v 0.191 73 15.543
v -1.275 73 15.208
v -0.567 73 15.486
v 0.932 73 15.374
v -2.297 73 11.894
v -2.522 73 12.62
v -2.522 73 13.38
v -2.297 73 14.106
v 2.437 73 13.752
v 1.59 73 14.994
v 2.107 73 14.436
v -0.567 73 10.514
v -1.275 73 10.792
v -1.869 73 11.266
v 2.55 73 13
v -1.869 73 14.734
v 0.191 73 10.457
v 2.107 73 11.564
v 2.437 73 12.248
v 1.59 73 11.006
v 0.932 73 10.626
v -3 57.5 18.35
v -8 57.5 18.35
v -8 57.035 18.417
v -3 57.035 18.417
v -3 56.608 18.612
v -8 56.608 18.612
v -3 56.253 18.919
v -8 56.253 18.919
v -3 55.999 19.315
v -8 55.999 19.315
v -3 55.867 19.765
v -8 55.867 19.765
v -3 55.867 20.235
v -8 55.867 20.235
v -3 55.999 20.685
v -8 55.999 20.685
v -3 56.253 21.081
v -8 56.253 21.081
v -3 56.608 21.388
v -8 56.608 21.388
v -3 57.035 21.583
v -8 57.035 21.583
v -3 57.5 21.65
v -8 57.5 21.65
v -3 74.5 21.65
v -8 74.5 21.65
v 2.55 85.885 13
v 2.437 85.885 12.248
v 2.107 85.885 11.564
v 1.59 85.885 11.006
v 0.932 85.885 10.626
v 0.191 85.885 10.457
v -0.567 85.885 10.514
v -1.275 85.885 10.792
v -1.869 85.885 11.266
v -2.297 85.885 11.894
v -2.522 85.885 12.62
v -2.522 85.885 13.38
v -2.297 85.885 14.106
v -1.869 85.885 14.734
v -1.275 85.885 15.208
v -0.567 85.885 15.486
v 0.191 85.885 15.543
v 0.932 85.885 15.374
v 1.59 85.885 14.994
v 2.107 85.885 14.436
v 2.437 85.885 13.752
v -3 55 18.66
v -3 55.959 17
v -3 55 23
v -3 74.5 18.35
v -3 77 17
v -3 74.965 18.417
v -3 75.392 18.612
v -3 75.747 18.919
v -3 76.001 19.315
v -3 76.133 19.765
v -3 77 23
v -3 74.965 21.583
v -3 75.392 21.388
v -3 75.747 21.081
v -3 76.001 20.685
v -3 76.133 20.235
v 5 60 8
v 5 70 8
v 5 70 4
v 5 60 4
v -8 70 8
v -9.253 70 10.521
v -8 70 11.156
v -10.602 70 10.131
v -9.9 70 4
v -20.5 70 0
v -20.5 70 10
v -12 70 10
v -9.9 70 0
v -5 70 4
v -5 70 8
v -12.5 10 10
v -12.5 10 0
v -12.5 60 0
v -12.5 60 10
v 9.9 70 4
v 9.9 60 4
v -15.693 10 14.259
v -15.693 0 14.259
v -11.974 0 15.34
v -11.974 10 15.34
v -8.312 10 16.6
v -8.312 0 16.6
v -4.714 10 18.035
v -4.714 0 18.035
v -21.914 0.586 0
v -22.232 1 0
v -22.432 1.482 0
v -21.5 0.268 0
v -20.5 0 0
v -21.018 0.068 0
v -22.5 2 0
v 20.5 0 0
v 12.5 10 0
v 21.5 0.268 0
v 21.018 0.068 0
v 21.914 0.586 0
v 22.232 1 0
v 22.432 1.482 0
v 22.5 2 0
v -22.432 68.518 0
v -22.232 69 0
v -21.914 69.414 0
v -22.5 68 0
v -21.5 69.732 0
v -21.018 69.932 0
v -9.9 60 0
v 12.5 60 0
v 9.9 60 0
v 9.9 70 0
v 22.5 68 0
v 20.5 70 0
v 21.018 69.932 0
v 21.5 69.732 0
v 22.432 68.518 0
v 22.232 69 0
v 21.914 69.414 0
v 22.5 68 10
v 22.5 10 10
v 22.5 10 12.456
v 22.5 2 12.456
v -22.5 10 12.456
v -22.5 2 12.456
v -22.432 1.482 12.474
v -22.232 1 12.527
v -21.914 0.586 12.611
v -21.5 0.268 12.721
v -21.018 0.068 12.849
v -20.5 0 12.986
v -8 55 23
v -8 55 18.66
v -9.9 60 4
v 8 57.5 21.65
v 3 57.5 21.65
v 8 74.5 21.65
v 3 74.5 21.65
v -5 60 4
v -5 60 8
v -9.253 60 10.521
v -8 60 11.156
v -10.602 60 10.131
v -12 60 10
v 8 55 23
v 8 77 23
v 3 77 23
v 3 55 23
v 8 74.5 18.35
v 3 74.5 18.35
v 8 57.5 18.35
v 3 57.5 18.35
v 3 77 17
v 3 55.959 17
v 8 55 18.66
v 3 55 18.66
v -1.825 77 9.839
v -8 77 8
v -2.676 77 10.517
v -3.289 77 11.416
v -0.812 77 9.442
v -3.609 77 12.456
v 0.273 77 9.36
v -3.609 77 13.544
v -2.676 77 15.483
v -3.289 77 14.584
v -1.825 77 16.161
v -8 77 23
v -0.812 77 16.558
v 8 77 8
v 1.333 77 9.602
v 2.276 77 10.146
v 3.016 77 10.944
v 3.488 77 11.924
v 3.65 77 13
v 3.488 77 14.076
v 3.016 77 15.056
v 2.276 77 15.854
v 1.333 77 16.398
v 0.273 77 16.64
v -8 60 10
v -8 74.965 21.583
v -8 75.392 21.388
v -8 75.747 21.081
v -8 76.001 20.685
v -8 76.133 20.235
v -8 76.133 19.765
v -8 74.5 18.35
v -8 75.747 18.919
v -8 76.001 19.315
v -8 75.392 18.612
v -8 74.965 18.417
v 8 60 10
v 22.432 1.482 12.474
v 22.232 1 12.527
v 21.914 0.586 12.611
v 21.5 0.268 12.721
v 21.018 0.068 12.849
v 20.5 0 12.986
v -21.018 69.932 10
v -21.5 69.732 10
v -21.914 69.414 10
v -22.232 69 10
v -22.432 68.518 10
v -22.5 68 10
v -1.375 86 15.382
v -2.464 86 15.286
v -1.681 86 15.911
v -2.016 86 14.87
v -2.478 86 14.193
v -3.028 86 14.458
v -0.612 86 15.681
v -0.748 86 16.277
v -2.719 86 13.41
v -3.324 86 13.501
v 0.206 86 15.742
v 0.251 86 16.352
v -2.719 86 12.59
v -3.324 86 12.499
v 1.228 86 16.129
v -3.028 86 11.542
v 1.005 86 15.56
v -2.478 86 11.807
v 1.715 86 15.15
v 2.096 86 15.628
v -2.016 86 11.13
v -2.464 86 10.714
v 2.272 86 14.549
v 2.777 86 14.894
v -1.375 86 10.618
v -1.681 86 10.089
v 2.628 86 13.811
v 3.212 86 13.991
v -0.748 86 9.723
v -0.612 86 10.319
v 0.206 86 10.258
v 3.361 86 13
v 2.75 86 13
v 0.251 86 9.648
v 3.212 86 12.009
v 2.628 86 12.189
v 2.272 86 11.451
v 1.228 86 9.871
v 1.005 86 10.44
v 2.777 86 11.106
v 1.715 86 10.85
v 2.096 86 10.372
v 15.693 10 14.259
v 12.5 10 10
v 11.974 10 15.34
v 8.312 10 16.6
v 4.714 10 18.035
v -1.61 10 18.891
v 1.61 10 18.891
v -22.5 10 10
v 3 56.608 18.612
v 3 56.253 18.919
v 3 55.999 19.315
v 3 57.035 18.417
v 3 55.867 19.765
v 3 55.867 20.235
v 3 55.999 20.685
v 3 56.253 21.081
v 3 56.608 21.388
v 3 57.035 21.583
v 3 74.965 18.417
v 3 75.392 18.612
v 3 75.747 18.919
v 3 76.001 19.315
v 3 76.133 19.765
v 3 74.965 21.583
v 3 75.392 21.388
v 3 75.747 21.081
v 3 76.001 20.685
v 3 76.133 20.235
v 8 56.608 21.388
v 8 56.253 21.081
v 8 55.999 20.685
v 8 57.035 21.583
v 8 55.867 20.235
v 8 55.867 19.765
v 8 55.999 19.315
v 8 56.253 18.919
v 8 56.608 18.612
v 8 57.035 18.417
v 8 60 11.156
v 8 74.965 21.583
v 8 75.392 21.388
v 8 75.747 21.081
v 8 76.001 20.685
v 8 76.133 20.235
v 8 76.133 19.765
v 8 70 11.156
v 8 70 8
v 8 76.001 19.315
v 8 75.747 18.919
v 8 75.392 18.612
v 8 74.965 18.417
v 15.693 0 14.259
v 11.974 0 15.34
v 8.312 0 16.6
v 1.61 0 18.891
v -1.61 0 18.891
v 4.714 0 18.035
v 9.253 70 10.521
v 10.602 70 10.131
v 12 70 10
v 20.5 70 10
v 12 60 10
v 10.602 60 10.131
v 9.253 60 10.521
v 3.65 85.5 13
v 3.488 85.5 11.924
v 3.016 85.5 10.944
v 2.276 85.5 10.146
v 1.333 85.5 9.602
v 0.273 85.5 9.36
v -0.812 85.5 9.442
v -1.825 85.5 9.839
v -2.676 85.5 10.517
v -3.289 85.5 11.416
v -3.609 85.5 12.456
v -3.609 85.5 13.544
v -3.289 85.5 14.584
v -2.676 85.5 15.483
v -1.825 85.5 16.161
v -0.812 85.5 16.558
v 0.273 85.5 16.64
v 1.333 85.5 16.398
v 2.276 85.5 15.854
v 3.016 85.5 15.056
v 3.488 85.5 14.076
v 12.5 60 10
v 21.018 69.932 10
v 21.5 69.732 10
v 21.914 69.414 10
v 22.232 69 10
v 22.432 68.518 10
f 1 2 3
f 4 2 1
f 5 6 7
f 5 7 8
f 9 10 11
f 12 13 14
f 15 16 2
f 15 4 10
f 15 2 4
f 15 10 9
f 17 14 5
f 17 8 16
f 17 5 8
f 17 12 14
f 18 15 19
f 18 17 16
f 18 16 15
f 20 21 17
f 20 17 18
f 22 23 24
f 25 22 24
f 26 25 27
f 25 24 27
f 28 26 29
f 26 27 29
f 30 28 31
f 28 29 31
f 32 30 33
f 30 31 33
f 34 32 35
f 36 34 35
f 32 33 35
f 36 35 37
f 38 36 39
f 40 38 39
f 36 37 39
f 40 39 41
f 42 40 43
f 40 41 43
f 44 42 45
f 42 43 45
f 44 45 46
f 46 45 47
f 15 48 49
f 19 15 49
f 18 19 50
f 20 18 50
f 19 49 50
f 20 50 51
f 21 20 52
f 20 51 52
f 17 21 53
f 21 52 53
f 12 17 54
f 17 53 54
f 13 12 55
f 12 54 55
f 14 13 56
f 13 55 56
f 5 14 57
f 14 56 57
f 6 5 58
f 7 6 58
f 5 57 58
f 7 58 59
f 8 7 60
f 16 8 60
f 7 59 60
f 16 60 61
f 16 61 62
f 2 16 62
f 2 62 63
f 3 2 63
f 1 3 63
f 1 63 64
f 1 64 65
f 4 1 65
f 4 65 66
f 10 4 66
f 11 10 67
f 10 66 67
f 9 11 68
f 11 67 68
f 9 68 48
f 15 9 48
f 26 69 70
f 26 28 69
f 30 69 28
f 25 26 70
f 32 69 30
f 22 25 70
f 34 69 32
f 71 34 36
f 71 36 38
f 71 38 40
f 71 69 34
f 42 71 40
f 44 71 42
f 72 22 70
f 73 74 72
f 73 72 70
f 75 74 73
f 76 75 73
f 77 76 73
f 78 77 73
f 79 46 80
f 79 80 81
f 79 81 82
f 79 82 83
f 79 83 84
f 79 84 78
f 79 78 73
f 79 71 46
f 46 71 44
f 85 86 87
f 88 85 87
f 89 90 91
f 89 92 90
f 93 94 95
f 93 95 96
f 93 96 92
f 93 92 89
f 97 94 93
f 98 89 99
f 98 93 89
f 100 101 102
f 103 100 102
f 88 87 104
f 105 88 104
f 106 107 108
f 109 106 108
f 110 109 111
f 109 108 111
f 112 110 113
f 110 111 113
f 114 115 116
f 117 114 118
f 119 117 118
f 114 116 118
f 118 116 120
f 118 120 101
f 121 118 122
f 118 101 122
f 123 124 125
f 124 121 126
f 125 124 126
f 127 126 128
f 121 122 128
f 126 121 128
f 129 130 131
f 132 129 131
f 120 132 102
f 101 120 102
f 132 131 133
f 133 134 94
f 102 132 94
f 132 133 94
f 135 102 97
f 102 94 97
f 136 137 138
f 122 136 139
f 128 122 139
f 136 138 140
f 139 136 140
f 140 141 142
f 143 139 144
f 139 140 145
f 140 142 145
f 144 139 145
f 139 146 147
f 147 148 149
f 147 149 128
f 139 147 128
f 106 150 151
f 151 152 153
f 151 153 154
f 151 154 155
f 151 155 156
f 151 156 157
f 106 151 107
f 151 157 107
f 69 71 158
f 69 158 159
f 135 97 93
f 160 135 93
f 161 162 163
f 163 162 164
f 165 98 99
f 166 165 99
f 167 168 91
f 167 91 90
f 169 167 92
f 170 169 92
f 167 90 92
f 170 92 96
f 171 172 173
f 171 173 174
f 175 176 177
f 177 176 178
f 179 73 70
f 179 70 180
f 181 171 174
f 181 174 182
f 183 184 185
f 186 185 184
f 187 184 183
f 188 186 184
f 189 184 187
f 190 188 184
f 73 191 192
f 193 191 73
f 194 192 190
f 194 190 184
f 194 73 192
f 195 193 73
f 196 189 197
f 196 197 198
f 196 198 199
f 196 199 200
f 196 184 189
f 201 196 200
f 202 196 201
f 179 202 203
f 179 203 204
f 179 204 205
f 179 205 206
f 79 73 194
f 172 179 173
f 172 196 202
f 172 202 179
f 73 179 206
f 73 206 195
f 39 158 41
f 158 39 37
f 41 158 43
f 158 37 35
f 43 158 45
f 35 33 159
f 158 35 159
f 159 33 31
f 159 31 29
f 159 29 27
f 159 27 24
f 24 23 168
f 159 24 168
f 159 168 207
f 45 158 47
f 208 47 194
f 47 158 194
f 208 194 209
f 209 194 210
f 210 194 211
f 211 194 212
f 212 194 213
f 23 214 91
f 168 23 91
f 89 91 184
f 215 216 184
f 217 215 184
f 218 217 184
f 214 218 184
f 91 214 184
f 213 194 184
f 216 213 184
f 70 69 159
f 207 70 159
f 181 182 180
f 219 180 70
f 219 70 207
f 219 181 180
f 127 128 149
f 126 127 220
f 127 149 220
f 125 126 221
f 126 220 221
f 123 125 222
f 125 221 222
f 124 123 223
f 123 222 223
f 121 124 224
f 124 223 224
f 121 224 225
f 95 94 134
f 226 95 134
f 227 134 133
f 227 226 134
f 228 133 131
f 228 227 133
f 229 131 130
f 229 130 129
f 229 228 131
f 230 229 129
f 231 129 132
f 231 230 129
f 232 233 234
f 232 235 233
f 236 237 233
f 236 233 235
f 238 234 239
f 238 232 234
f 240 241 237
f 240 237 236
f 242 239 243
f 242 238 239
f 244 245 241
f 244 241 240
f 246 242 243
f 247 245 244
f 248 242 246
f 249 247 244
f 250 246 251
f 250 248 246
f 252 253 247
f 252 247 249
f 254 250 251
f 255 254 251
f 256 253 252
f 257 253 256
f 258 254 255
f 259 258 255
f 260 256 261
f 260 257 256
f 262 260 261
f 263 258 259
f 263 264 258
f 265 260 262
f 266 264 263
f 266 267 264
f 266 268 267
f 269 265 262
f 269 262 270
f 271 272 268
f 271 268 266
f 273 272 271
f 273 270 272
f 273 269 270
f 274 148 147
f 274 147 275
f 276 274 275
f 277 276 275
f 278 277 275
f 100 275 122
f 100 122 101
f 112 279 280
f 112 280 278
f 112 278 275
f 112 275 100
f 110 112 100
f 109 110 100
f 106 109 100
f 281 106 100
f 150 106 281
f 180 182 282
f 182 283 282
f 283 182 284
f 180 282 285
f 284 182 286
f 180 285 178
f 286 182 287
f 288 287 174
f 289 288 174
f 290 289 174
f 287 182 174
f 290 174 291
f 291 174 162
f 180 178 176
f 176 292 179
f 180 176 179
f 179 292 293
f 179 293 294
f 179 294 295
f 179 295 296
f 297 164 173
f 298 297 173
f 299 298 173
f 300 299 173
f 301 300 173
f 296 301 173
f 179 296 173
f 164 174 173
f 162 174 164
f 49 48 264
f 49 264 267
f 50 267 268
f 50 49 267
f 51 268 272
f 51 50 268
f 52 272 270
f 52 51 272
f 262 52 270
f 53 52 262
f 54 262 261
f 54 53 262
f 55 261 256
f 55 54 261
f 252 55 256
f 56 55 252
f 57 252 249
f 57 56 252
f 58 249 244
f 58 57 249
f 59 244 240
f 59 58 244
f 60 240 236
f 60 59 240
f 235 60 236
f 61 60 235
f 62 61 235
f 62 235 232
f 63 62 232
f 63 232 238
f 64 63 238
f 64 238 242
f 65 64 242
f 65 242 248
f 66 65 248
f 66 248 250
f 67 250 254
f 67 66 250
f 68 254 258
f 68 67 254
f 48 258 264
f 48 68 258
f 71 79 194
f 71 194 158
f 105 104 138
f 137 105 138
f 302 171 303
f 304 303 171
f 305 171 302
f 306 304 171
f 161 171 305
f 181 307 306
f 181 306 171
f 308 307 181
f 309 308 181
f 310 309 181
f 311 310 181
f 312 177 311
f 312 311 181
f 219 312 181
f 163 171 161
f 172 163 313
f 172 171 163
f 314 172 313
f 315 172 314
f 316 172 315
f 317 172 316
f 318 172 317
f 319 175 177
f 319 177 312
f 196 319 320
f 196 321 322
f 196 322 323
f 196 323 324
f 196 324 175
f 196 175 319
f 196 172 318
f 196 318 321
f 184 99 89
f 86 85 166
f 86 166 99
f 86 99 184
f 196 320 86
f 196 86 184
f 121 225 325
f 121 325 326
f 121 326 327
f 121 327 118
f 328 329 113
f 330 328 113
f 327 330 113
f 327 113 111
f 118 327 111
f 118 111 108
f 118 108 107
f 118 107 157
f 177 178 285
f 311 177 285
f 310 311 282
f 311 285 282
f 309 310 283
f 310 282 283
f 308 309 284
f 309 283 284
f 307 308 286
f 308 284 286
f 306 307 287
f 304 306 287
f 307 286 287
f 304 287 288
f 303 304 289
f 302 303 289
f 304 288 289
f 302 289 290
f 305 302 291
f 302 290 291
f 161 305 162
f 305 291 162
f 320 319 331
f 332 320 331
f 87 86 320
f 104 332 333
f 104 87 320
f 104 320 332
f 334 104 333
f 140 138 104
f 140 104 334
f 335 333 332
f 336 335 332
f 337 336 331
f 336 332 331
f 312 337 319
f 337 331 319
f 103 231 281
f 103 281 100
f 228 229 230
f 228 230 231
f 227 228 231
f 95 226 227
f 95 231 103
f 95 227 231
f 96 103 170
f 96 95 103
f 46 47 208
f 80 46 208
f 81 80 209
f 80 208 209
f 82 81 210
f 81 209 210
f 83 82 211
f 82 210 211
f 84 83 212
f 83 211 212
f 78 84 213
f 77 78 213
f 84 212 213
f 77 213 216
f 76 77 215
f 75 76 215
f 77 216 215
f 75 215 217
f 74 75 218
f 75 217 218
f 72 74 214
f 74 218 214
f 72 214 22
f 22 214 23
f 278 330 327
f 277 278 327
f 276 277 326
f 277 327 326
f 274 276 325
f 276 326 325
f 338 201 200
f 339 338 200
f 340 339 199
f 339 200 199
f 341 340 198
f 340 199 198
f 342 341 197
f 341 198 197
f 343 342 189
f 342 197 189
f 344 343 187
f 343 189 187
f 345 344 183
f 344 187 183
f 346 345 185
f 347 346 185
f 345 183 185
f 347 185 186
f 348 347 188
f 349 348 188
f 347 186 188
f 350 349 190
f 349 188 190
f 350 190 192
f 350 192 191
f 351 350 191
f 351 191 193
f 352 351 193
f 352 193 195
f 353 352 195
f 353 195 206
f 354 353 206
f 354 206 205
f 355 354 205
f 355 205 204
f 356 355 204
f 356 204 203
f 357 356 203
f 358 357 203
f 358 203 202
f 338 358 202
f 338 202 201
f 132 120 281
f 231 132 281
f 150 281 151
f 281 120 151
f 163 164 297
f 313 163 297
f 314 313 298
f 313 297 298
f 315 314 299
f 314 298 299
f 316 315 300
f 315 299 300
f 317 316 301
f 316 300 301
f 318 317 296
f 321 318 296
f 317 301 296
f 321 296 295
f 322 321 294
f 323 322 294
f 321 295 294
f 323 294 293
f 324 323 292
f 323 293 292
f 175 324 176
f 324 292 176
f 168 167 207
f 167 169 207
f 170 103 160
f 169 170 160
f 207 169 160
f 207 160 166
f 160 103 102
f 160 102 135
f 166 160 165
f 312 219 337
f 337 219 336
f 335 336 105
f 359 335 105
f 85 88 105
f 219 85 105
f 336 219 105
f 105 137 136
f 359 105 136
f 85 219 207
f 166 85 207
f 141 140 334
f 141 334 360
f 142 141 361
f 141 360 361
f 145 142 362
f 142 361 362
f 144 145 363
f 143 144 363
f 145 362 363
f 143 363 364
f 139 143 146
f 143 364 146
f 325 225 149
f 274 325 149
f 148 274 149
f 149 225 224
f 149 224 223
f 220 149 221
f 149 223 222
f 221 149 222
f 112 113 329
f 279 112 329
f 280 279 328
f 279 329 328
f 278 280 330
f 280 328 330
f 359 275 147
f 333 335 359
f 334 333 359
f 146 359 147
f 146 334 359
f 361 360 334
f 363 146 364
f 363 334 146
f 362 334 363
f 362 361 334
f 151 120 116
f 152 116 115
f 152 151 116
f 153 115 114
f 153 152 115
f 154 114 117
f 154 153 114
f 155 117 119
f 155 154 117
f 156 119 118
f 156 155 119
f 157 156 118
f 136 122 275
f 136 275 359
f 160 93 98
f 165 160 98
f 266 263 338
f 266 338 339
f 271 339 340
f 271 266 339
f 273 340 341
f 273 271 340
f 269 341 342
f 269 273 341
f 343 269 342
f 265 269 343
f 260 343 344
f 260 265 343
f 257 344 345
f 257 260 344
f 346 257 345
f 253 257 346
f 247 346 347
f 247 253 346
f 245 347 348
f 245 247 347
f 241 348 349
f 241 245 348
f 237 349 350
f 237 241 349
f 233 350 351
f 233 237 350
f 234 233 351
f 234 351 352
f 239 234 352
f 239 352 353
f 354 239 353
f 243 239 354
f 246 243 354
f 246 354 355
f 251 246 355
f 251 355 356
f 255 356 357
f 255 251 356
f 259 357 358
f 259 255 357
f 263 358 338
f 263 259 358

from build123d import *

# Parameters (mm, degrees)
SKETCH2_W               = 45
SKETCH2_H               = 70
SKETCH2_W_2             = 25
SKETCH2_H_2             = 50
BOSS_EXTRUDE2_DEPTH     = 10
CUT_EXTRUDE1_REACH      = 72
BOSS_EXTRUDE3_DEPTH     = 10
SKETCH6_R               = 3.65
BOSS_EXTRUDE4_DEPTH     = 16
BOSS_EXTRUDE5_DEPTH     = 10
BOSS_EXTRUDE8_DEPTH     = 8
SKETCH9_W               = 6
SKETCH9_H               = 22
CUT_EXTRUDE2_DEPTH      = 6
CUT_EXTRUDE3_DEPTH      = 15.5
CUT_EXTRUDE3_DEPTH_BACK = 31.5
SKETCH11_R              = 2.55
CUT_EXTRUDE4_DEPTH      = 13
CHAMFER1_SIZE           = 0.2
CHAMFER1_SIZE2          = 0.115470054
CHAMFER2_SIZE           = 0.5
CHAMFER2_SIZE2          = 0.288675135
FILLET1_R               = 2


with BuildPart() as part:
    # Sketch2 → Boss-Extrude2 (new body)
    with BuildSketch(Plane.XY):
        with Locations((0, 35)):
            Rectangle(SKETCH2_W, SKETCH2_H)
        with Locations((0, 35)):
            Rectangle(SKETCH2_W_2, SKETCH2_H_2, mode=Mode.SUBTRACT)
    extrude(amount=BOSS_EXTRUDE2_DEPTH)

    # Sketch3 → Cut-Extrude1 (cut, up to next)
    with BuildSketch(Plane(origin=(0, 70, 0), x_dir=(1, 0, 0), z_dir=(0, 1, 0)), mode=Mode.PRIVATE) as cut_extrude1_sk1:
        Polygon((-9.9, 0), (-9.9, -4), (-5, -4), (-5, -8), (5, -8), (5, -4), (9.9, -4), (9.9, 0), align=None)
    cut_extrude1_tool1 = extrude(cut_extrude1_sk1.sketch, amount=-CUT_EXTRUDE1_REACH, mode=Mode.PRIVATE) & part.part
    add(cut_extrude1_tool1.solids().sort_by_distance((0, 70, 3.342282))[0], mode=Mode.SUBTRACT)

    # Sketch4 → Boss-Extrude3 (add)
    with BuildSketch(Plane(origin=(0, 70, 0), x_dir=(1, 0, 0), z_dir=(0, 1, 0))):
        with BuildLine():
            Line((-12, -10), (12, -10))
            ThreePointArc((12, -10), (7.5, -11.5), (4.8, -15.4))
            ThreePointArc((4.8, -15.4), (0, -19), (-4.8, -15.4))
            ThreePointArc((-4.8, -15.4), (-7.5, -11.5), (-12, -10))
        make_face()
    extrude(amount=-BOSS_EXTRUDE3_DEPTH)

    # Sketch6 → Boss-Extrude4 (add)
    with BuildSketch(Plane(origin=(0, 70, 0), x_dir=(1, 0, 0), z_dir=(0, 1, 0))):
        with Locations((0, -13)):
            Circle(SKETCH6_R)
    extrude(amount=BOSS_EXTRUDE4_DEPTH)

    # Sketch7 → Boss-Extrude5 (add)
    with BuildSketch(Plane.XZ):
        with BuildLine():
            Line((-22.5, 10), (-22.5, 12.456100996))
            Line((-22.5, 12.456100996), (-15.693142744, 14.258664405))
            ThreePointArc((-15.693142744, 14.258664405), (-10.135286431, 15.948047702), (-4.714257706, 18.035206128))
            ThreePointArc((-4.714257706, 18.035206128), (0, 19), (4.714257706, 18.035206128))
            ThreePointArc((4.714257706, 18.035206128), (10.135286431, 15.948047702), (15.693142744, 14.258664405))
            Line((15.693142744, 14.258664405), (22.5, 12.456100996))
            Line((22.5, 12.456100996), (22.5, 10))
            Line((22.5, 10), (-22.5, 10))
        make_face()
    extrude(amount=-BOSS_EXTRUDE5_DEPTH)

    # Sketch8 → Boss-Extrude8 (add, symmetric)
    with BuildSketch(Plane(origin=(0, 0, 0), x_dir=(0, 0, -1), z_dir=(1, 0, 0))):
        Polygon((-19, 77), (-23, 77), (-23, 55), (-18.660254038, 55), (-10, 60), (-10, 70), (-8, 70), (-8, 77), (-10, 77), align=None)
    extrude(amount=BOSS_EXTRUDE8_DEPTH, both=True)

    # Sketch9 → Cut-Extrude2 (cut)
    with BuildSketch(Plane.XY.offset(23)):
        with Locations((0, 66)):
            Rectangle(SKETCH9_W, SKETCH9_H)
    extrude(amount=-CUT_EXTRUDE2_DEPTH, mode=Mode.SUBTRACT)

    # Sketch10 → Cut-Extrude3 (cut, two sides)
    with BuildSketch(Plane.ZY.offset(8)) as cut_extrude3_sk:
        with BuildLine():
            Line((18.35, 74.5), (18.35, 57.5))
            ThreePointArc((18.35, 57.5), (20, 55.85), (21.65, 57.5))
            Line((21.65, 57.5), (21.65, 74.5))
            ThreePointArc((21.65, 74.5), (20, 76.15), (18.35, 74.5))
        make_face()
    extrude(amount=CUT_EXTRUDE3_DEPTH, mode=Mode.SUBTRACT)
    extrude(cut_extrude3_sk.sketch, amount=-CUT_EXTRUDE3_DEPTH_BACK, mode=Mode.SUBTRACT)

    # Sketch11 → Cut-Extrude4 (cut)
    with BuildSketch(Plane(origin=(0, 86, 0), x_dir=(1, 0, 0), z_dir=(0, 1, 0))):
        with Locations((0, -13)):
            Circle(SKETCH11_R)
    extrude(amount=-CUT_EXTRUDE4_DEPTH, mode=Mode.SUBTRACT)

    # Chamfer1
    chamfer1_edges = [part.edges().sort_by_distance(p)[0] for p in [
        (-2.55, 86, 13),
    ]]
    chamfer1_side = [part.faces().sort_by_distance(p)[0] for p in [
        (-3.54676241, 86, 13),
    ]]
    chamfer(chamfer1_edges, length=CHAMFER1_SIZE, length2=CHAMFER1_SIZE2, reference=chamfer1_side[0])

    # Chamfer2
    chamfer2_edges = [part.edges().sort_by_distance(p)[0] for p in [
        (-3.65, 86, 13),
    ]]
    chamfer2_side = [part.faces().sort_by_distance(p)[0] for p in [
        (-3.65, 81.5, 13),
    ]]
    chamfer(chamfer2_edges, length=CHAMFER2_SIZE, length2=CHAMFER2_SIZE2, reference=chamfer2_side[0])

    # Fillet1
    fillet1_edges = [part.edges().sort_by_distance(p)[0] for p in [
        (-22.5, 70, 5),
        (22.5, 70, 5),
        (22.5, 0, 6.228050498),
        (-22.5, 0, 6.228050498),
    ]]
    fillet(fillet1_edges, radius=FILLET1_R)


solid = part.part
